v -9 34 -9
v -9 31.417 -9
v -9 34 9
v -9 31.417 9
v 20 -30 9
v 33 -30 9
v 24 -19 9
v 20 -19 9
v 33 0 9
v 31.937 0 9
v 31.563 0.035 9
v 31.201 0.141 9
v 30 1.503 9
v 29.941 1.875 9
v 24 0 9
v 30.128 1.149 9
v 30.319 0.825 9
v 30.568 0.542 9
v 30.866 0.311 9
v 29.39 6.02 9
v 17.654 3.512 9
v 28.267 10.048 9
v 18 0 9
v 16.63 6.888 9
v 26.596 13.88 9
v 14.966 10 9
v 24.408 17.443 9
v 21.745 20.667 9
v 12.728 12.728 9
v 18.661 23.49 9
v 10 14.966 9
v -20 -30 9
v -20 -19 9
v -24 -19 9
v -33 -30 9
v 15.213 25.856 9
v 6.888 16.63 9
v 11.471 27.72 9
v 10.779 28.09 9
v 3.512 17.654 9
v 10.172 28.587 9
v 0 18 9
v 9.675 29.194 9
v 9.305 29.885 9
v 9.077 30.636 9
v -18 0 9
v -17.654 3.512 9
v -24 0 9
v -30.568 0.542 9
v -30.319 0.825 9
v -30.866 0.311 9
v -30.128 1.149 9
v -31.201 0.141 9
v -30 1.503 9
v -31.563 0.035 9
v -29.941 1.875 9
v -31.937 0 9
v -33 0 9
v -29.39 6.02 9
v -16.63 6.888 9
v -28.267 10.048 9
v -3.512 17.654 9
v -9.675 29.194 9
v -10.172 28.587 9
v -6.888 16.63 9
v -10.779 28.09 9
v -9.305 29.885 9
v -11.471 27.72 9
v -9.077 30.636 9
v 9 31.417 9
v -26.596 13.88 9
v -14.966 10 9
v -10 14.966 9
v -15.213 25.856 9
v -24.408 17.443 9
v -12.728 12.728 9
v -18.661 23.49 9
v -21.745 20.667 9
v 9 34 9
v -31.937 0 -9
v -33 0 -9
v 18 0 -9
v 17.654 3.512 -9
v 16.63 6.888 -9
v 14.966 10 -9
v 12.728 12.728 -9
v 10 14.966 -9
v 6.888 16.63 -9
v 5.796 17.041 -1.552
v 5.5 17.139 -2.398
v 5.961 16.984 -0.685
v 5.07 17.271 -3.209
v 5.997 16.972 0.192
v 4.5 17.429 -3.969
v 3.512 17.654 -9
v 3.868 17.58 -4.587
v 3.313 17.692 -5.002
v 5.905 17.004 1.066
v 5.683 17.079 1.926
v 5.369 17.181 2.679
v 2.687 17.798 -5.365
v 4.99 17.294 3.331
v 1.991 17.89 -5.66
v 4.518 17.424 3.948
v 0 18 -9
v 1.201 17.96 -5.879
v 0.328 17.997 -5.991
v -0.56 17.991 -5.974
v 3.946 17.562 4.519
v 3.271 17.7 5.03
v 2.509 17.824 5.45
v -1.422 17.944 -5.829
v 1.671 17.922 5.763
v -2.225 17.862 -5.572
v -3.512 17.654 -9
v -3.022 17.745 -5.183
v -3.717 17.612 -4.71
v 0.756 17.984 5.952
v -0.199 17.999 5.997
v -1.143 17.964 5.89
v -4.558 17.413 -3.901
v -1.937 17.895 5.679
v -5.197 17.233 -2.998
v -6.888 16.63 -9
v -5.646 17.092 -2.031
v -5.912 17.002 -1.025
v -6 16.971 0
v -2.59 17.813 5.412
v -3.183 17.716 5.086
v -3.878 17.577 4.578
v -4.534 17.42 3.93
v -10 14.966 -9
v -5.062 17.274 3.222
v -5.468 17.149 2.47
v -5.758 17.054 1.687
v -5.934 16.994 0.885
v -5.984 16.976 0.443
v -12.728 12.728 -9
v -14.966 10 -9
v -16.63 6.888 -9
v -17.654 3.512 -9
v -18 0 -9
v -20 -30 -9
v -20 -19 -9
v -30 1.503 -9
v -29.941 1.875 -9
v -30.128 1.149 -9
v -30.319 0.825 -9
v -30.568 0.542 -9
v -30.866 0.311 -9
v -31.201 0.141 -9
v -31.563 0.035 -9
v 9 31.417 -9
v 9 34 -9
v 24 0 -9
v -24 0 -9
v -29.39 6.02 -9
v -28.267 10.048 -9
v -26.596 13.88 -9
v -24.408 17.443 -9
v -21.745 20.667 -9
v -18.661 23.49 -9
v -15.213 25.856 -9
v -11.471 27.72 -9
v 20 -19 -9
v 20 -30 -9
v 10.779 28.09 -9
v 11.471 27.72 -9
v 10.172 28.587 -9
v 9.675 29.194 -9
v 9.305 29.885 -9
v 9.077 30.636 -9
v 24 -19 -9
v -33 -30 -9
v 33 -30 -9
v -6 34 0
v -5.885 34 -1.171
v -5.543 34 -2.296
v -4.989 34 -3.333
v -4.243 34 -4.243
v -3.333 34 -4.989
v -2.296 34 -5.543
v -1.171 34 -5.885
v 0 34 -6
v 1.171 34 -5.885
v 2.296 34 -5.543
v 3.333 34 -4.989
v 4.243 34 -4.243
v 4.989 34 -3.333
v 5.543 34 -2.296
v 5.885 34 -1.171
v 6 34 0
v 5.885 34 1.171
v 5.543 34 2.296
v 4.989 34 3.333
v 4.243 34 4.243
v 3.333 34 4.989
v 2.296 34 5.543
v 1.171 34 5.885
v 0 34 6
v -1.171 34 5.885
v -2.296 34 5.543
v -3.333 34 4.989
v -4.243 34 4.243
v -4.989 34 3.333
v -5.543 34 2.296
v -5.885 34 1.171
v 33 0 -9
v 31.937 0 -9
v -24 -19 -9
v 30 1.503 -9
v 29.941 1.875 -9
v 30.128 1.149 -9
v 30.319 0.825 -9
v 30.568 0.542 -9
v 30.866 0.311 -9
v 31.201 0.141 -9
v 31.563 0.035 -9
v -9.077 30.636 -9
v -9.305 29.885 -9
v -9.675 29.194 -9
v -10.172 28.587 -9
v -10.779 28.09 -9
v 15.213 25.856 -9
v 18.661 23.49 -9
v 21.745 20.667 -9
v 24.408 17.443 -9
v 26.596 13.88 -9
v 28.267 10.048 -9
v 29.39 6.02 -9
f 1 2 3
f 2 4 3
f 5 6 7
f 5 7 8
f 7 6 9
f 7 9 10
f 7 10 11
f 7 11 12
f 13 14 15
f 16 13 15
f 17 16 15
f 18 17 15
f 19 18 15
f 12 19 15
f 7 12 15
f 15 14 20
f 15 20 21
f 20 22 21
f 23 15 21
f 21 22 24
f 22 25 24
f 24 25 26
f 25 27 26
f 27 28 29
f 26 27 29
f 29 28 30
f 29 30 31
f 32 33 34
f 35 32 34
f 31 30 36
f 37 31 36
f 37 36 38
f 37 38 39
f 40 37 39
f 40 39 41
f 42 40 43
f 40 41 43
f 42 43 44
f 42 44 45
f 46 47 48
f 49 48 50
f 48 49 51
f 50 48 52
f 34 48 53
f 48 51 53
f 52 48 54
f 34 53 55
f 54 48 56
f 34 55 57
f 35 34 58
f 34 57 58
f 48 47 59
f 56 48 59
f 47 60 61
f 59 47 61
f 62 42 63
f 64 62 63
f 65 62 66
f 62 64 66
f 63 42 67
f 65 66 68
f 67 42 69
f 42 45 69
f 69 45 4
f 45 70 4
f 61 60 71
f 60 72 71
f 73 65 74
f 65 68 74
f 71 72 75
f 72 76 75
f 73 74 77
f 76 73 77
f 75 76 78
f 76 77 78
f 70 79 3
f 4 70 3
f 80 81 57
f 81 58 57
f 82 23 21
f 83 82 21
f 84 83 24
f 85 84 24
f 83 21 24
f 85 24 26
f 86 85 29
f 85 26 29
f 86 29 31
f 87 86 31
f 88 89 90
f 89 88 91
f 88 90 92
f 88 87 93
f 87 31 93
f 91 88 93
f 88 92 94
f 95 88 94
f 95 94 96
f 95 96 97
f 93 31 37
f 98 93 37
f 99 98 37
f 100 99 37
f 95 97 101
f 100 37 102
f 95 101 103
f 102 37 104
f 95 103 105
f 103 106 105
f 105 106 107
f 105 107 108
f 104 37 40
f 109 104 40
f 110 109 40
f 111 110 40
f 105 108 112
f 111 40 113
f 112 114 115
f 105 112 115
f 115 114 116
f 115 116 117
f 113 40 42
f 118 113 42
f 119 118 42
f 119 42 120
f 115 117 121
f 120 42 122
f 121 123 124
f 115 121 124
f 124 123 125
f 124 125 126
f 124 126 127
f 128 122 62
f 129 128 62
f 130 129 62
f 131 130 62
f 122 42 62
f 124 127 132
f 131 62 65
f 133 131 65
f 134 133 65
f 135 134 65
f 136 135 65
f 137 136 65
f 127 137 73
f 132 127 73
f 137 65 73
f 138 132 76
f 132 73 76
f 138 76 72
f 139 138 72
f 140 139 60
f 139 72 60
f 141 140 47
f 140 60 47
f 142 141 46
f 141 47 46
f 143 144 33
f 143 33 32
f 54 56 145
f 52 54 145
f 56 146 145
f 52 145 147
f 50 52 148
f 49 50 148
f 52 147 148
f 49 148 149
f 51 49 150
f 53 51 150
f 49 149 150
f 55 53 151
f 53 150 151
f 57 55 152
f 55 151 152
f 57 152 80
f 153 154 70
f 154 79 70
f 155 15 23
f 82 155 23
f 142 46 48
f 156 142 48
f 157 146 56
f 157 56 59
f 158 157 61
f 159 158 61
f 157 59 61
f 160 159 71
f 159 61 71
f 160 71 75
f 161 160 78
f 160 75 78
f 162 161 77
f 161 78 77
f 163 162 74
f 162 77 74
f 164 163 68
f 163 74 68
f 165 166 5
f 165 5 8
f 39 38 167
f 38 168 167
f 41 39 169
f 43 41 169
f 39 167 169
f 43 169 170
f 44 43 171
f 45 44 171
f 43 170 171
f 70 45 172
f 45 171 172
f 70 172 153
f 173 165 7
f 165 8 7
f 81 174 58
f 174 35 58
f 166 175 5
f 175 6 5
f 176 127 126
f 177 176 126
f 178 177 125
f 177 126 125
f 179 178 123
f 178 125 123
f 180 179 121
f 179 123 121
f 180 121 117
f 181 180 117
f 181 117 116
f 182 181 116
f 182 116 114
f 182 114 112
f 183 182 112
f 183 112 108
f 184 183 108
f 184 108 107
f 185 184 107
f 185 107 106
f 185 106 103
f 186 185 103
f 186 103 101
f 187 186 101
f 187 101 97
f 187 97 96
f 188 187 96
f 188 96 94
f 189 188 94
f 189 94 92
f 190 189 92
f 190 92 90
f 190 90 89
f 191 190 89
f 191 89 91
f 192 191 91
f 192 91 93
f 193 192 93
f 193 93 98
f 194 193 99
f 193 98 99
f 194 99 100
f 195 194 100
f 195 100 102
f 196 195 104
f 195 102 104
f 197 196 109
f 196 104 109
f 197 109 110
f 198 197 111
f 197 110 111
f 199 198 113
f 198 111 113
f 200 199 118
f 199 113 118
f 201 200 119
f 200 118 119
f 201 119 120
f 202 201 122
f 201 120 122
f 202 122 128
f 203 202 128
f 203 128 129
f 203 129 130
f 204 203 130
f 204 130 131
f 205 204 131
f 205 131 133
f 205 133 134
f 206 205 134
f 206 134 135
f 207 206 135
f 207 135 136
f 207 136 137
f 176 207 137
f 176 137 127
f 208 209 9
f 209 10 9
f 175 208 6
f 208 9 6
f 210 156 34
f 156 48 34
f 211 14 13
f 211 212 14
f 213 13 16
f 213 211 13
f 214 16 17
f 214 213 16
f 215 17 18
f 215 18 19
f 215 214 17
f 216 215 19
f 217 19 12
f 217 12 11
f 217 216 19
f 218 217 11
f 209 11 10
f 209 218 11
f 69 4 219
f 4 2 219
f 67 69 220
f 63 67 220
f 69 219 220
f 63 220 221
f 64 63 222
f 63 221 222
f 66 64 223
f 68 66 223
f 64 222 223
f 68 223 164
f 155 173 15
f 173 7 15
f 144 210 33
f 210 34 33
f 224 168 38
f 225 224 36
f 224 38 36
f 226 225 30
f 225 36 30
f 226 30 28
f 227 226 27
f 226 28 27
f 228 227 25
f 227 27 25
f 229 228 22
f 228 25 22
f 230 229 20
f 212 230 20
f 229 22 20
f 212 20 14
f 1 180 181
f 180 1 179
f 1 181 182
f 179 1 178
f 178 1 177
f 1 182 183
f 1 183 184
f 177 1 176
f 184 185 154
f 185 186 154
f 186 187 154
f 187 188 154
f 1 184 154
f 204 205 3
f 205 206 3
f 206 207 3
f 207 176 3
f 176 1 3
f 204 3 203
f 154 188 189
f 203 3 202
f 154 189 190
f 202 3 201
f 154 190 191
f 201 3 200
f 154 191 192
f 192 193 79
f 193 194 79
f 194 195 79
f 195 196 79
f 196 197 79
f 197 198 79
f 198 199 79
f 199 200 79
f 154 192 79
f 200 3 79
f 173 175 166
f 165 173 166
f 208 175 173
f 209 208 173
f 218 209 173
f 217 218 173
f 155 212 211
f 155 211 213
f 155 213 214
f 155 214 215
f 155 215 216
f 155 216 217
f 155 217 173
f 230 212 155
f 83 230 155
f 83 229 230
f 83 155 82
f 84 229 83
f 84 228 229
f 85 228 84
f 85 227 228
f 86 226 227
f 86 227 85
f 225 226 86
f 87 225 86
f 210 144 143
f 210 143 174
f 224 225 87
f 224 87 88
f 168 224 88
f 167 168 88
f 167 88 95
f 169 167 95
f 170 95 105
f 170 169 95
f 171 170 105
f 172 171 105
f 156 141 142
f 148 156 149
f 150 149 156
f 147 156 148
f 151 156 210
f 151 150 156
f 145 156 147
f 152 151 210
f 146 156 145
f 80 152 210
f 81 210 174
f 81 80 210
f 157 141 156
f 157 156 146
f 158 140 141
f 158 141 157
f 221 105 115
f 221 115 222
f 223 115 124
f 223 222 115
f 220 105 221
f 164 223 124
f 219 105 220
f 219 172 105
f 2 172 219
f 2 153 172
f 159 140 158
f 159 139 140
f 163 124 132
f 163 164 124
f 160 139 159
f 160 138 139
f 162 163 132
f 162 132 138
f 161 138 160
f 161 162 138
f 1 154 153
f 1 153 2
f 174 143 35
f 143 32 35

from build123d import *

# Parameters (mm, degrees)
BOSS_EXTRUDE1_DEPTH = 9
FILLET1_R           = 4
FILLET2_R           = 2
HOLE1_D             = 12


with BuildPart() as part:
    # Sketch1 → Boss-Extrude1 (new, symmetric)
    with BuildSketch(Plane.XY):
        with BuildLine():
            Line((-18, 0), (-24, 0))
            Line((-24, 0), (-24, -19))
            Line((-24, -19), (-20, -19))
            Line((-20, -19), (-20, -30))
            Line((-20, -30), (-33, -30))
            Line((-33, -30), (-33, 0))
            Line((-33, 0), (-30, 0))
            ThreePointArc((-30, 0), (-24.186773245, 17.748239349), (-9, 28.618176043))
            Line((-9, 28.618176043), (-9, 34))
            Line((-9, 34), (9, 34))
            Line((9, 34), (9, 28.618176043))
            ThreePointArc((9, 28.618176043), (24.186773245, 17.748239349), (30, 0))
            Line((30, 0), (33, 0))
            Line((33, 0), (33, -30))
            Line((33, -30), (20, -30))
            Line((20, -30), (20, -19))
            Line((20, -19), (24, -19))
            Line((24, -19), (24, 0))
            Line((24, 0), (18, 0))
            ThreePointArc((18, 0), (0, 18), (-18, 0))
        make_face()
    extrude(amount=BOSS_EXTRUDE1_DEPTH, both=True)

    # Fillet1
    fillet1_edges = [part.edges().sort_by_distance(p)[0] for p in [
        (-9, 28.618176043, 0),
        (9, 28.618176043, 0),
    ]]
    fillet(fillet1_edges, radius=FILLET1_R)

    # Fillet2
    fillet2_edges = [part.edges().sort_by_distance(p)[0] for p in [
        (30, 0, 0),
        (-30, 0, 0),
    ]]
    fillet(fillet2_edges, radius=FILLET2_R)

    # Hole1 (through all)
    with Locations(Plane(origin=(0, 34, 0), x_dir=(1, 0, 0), z_dir=(0, 1, 0))):
        with Locations((0, 0)):
            Hole(HOLE1_D / 2)


solid = part.part
